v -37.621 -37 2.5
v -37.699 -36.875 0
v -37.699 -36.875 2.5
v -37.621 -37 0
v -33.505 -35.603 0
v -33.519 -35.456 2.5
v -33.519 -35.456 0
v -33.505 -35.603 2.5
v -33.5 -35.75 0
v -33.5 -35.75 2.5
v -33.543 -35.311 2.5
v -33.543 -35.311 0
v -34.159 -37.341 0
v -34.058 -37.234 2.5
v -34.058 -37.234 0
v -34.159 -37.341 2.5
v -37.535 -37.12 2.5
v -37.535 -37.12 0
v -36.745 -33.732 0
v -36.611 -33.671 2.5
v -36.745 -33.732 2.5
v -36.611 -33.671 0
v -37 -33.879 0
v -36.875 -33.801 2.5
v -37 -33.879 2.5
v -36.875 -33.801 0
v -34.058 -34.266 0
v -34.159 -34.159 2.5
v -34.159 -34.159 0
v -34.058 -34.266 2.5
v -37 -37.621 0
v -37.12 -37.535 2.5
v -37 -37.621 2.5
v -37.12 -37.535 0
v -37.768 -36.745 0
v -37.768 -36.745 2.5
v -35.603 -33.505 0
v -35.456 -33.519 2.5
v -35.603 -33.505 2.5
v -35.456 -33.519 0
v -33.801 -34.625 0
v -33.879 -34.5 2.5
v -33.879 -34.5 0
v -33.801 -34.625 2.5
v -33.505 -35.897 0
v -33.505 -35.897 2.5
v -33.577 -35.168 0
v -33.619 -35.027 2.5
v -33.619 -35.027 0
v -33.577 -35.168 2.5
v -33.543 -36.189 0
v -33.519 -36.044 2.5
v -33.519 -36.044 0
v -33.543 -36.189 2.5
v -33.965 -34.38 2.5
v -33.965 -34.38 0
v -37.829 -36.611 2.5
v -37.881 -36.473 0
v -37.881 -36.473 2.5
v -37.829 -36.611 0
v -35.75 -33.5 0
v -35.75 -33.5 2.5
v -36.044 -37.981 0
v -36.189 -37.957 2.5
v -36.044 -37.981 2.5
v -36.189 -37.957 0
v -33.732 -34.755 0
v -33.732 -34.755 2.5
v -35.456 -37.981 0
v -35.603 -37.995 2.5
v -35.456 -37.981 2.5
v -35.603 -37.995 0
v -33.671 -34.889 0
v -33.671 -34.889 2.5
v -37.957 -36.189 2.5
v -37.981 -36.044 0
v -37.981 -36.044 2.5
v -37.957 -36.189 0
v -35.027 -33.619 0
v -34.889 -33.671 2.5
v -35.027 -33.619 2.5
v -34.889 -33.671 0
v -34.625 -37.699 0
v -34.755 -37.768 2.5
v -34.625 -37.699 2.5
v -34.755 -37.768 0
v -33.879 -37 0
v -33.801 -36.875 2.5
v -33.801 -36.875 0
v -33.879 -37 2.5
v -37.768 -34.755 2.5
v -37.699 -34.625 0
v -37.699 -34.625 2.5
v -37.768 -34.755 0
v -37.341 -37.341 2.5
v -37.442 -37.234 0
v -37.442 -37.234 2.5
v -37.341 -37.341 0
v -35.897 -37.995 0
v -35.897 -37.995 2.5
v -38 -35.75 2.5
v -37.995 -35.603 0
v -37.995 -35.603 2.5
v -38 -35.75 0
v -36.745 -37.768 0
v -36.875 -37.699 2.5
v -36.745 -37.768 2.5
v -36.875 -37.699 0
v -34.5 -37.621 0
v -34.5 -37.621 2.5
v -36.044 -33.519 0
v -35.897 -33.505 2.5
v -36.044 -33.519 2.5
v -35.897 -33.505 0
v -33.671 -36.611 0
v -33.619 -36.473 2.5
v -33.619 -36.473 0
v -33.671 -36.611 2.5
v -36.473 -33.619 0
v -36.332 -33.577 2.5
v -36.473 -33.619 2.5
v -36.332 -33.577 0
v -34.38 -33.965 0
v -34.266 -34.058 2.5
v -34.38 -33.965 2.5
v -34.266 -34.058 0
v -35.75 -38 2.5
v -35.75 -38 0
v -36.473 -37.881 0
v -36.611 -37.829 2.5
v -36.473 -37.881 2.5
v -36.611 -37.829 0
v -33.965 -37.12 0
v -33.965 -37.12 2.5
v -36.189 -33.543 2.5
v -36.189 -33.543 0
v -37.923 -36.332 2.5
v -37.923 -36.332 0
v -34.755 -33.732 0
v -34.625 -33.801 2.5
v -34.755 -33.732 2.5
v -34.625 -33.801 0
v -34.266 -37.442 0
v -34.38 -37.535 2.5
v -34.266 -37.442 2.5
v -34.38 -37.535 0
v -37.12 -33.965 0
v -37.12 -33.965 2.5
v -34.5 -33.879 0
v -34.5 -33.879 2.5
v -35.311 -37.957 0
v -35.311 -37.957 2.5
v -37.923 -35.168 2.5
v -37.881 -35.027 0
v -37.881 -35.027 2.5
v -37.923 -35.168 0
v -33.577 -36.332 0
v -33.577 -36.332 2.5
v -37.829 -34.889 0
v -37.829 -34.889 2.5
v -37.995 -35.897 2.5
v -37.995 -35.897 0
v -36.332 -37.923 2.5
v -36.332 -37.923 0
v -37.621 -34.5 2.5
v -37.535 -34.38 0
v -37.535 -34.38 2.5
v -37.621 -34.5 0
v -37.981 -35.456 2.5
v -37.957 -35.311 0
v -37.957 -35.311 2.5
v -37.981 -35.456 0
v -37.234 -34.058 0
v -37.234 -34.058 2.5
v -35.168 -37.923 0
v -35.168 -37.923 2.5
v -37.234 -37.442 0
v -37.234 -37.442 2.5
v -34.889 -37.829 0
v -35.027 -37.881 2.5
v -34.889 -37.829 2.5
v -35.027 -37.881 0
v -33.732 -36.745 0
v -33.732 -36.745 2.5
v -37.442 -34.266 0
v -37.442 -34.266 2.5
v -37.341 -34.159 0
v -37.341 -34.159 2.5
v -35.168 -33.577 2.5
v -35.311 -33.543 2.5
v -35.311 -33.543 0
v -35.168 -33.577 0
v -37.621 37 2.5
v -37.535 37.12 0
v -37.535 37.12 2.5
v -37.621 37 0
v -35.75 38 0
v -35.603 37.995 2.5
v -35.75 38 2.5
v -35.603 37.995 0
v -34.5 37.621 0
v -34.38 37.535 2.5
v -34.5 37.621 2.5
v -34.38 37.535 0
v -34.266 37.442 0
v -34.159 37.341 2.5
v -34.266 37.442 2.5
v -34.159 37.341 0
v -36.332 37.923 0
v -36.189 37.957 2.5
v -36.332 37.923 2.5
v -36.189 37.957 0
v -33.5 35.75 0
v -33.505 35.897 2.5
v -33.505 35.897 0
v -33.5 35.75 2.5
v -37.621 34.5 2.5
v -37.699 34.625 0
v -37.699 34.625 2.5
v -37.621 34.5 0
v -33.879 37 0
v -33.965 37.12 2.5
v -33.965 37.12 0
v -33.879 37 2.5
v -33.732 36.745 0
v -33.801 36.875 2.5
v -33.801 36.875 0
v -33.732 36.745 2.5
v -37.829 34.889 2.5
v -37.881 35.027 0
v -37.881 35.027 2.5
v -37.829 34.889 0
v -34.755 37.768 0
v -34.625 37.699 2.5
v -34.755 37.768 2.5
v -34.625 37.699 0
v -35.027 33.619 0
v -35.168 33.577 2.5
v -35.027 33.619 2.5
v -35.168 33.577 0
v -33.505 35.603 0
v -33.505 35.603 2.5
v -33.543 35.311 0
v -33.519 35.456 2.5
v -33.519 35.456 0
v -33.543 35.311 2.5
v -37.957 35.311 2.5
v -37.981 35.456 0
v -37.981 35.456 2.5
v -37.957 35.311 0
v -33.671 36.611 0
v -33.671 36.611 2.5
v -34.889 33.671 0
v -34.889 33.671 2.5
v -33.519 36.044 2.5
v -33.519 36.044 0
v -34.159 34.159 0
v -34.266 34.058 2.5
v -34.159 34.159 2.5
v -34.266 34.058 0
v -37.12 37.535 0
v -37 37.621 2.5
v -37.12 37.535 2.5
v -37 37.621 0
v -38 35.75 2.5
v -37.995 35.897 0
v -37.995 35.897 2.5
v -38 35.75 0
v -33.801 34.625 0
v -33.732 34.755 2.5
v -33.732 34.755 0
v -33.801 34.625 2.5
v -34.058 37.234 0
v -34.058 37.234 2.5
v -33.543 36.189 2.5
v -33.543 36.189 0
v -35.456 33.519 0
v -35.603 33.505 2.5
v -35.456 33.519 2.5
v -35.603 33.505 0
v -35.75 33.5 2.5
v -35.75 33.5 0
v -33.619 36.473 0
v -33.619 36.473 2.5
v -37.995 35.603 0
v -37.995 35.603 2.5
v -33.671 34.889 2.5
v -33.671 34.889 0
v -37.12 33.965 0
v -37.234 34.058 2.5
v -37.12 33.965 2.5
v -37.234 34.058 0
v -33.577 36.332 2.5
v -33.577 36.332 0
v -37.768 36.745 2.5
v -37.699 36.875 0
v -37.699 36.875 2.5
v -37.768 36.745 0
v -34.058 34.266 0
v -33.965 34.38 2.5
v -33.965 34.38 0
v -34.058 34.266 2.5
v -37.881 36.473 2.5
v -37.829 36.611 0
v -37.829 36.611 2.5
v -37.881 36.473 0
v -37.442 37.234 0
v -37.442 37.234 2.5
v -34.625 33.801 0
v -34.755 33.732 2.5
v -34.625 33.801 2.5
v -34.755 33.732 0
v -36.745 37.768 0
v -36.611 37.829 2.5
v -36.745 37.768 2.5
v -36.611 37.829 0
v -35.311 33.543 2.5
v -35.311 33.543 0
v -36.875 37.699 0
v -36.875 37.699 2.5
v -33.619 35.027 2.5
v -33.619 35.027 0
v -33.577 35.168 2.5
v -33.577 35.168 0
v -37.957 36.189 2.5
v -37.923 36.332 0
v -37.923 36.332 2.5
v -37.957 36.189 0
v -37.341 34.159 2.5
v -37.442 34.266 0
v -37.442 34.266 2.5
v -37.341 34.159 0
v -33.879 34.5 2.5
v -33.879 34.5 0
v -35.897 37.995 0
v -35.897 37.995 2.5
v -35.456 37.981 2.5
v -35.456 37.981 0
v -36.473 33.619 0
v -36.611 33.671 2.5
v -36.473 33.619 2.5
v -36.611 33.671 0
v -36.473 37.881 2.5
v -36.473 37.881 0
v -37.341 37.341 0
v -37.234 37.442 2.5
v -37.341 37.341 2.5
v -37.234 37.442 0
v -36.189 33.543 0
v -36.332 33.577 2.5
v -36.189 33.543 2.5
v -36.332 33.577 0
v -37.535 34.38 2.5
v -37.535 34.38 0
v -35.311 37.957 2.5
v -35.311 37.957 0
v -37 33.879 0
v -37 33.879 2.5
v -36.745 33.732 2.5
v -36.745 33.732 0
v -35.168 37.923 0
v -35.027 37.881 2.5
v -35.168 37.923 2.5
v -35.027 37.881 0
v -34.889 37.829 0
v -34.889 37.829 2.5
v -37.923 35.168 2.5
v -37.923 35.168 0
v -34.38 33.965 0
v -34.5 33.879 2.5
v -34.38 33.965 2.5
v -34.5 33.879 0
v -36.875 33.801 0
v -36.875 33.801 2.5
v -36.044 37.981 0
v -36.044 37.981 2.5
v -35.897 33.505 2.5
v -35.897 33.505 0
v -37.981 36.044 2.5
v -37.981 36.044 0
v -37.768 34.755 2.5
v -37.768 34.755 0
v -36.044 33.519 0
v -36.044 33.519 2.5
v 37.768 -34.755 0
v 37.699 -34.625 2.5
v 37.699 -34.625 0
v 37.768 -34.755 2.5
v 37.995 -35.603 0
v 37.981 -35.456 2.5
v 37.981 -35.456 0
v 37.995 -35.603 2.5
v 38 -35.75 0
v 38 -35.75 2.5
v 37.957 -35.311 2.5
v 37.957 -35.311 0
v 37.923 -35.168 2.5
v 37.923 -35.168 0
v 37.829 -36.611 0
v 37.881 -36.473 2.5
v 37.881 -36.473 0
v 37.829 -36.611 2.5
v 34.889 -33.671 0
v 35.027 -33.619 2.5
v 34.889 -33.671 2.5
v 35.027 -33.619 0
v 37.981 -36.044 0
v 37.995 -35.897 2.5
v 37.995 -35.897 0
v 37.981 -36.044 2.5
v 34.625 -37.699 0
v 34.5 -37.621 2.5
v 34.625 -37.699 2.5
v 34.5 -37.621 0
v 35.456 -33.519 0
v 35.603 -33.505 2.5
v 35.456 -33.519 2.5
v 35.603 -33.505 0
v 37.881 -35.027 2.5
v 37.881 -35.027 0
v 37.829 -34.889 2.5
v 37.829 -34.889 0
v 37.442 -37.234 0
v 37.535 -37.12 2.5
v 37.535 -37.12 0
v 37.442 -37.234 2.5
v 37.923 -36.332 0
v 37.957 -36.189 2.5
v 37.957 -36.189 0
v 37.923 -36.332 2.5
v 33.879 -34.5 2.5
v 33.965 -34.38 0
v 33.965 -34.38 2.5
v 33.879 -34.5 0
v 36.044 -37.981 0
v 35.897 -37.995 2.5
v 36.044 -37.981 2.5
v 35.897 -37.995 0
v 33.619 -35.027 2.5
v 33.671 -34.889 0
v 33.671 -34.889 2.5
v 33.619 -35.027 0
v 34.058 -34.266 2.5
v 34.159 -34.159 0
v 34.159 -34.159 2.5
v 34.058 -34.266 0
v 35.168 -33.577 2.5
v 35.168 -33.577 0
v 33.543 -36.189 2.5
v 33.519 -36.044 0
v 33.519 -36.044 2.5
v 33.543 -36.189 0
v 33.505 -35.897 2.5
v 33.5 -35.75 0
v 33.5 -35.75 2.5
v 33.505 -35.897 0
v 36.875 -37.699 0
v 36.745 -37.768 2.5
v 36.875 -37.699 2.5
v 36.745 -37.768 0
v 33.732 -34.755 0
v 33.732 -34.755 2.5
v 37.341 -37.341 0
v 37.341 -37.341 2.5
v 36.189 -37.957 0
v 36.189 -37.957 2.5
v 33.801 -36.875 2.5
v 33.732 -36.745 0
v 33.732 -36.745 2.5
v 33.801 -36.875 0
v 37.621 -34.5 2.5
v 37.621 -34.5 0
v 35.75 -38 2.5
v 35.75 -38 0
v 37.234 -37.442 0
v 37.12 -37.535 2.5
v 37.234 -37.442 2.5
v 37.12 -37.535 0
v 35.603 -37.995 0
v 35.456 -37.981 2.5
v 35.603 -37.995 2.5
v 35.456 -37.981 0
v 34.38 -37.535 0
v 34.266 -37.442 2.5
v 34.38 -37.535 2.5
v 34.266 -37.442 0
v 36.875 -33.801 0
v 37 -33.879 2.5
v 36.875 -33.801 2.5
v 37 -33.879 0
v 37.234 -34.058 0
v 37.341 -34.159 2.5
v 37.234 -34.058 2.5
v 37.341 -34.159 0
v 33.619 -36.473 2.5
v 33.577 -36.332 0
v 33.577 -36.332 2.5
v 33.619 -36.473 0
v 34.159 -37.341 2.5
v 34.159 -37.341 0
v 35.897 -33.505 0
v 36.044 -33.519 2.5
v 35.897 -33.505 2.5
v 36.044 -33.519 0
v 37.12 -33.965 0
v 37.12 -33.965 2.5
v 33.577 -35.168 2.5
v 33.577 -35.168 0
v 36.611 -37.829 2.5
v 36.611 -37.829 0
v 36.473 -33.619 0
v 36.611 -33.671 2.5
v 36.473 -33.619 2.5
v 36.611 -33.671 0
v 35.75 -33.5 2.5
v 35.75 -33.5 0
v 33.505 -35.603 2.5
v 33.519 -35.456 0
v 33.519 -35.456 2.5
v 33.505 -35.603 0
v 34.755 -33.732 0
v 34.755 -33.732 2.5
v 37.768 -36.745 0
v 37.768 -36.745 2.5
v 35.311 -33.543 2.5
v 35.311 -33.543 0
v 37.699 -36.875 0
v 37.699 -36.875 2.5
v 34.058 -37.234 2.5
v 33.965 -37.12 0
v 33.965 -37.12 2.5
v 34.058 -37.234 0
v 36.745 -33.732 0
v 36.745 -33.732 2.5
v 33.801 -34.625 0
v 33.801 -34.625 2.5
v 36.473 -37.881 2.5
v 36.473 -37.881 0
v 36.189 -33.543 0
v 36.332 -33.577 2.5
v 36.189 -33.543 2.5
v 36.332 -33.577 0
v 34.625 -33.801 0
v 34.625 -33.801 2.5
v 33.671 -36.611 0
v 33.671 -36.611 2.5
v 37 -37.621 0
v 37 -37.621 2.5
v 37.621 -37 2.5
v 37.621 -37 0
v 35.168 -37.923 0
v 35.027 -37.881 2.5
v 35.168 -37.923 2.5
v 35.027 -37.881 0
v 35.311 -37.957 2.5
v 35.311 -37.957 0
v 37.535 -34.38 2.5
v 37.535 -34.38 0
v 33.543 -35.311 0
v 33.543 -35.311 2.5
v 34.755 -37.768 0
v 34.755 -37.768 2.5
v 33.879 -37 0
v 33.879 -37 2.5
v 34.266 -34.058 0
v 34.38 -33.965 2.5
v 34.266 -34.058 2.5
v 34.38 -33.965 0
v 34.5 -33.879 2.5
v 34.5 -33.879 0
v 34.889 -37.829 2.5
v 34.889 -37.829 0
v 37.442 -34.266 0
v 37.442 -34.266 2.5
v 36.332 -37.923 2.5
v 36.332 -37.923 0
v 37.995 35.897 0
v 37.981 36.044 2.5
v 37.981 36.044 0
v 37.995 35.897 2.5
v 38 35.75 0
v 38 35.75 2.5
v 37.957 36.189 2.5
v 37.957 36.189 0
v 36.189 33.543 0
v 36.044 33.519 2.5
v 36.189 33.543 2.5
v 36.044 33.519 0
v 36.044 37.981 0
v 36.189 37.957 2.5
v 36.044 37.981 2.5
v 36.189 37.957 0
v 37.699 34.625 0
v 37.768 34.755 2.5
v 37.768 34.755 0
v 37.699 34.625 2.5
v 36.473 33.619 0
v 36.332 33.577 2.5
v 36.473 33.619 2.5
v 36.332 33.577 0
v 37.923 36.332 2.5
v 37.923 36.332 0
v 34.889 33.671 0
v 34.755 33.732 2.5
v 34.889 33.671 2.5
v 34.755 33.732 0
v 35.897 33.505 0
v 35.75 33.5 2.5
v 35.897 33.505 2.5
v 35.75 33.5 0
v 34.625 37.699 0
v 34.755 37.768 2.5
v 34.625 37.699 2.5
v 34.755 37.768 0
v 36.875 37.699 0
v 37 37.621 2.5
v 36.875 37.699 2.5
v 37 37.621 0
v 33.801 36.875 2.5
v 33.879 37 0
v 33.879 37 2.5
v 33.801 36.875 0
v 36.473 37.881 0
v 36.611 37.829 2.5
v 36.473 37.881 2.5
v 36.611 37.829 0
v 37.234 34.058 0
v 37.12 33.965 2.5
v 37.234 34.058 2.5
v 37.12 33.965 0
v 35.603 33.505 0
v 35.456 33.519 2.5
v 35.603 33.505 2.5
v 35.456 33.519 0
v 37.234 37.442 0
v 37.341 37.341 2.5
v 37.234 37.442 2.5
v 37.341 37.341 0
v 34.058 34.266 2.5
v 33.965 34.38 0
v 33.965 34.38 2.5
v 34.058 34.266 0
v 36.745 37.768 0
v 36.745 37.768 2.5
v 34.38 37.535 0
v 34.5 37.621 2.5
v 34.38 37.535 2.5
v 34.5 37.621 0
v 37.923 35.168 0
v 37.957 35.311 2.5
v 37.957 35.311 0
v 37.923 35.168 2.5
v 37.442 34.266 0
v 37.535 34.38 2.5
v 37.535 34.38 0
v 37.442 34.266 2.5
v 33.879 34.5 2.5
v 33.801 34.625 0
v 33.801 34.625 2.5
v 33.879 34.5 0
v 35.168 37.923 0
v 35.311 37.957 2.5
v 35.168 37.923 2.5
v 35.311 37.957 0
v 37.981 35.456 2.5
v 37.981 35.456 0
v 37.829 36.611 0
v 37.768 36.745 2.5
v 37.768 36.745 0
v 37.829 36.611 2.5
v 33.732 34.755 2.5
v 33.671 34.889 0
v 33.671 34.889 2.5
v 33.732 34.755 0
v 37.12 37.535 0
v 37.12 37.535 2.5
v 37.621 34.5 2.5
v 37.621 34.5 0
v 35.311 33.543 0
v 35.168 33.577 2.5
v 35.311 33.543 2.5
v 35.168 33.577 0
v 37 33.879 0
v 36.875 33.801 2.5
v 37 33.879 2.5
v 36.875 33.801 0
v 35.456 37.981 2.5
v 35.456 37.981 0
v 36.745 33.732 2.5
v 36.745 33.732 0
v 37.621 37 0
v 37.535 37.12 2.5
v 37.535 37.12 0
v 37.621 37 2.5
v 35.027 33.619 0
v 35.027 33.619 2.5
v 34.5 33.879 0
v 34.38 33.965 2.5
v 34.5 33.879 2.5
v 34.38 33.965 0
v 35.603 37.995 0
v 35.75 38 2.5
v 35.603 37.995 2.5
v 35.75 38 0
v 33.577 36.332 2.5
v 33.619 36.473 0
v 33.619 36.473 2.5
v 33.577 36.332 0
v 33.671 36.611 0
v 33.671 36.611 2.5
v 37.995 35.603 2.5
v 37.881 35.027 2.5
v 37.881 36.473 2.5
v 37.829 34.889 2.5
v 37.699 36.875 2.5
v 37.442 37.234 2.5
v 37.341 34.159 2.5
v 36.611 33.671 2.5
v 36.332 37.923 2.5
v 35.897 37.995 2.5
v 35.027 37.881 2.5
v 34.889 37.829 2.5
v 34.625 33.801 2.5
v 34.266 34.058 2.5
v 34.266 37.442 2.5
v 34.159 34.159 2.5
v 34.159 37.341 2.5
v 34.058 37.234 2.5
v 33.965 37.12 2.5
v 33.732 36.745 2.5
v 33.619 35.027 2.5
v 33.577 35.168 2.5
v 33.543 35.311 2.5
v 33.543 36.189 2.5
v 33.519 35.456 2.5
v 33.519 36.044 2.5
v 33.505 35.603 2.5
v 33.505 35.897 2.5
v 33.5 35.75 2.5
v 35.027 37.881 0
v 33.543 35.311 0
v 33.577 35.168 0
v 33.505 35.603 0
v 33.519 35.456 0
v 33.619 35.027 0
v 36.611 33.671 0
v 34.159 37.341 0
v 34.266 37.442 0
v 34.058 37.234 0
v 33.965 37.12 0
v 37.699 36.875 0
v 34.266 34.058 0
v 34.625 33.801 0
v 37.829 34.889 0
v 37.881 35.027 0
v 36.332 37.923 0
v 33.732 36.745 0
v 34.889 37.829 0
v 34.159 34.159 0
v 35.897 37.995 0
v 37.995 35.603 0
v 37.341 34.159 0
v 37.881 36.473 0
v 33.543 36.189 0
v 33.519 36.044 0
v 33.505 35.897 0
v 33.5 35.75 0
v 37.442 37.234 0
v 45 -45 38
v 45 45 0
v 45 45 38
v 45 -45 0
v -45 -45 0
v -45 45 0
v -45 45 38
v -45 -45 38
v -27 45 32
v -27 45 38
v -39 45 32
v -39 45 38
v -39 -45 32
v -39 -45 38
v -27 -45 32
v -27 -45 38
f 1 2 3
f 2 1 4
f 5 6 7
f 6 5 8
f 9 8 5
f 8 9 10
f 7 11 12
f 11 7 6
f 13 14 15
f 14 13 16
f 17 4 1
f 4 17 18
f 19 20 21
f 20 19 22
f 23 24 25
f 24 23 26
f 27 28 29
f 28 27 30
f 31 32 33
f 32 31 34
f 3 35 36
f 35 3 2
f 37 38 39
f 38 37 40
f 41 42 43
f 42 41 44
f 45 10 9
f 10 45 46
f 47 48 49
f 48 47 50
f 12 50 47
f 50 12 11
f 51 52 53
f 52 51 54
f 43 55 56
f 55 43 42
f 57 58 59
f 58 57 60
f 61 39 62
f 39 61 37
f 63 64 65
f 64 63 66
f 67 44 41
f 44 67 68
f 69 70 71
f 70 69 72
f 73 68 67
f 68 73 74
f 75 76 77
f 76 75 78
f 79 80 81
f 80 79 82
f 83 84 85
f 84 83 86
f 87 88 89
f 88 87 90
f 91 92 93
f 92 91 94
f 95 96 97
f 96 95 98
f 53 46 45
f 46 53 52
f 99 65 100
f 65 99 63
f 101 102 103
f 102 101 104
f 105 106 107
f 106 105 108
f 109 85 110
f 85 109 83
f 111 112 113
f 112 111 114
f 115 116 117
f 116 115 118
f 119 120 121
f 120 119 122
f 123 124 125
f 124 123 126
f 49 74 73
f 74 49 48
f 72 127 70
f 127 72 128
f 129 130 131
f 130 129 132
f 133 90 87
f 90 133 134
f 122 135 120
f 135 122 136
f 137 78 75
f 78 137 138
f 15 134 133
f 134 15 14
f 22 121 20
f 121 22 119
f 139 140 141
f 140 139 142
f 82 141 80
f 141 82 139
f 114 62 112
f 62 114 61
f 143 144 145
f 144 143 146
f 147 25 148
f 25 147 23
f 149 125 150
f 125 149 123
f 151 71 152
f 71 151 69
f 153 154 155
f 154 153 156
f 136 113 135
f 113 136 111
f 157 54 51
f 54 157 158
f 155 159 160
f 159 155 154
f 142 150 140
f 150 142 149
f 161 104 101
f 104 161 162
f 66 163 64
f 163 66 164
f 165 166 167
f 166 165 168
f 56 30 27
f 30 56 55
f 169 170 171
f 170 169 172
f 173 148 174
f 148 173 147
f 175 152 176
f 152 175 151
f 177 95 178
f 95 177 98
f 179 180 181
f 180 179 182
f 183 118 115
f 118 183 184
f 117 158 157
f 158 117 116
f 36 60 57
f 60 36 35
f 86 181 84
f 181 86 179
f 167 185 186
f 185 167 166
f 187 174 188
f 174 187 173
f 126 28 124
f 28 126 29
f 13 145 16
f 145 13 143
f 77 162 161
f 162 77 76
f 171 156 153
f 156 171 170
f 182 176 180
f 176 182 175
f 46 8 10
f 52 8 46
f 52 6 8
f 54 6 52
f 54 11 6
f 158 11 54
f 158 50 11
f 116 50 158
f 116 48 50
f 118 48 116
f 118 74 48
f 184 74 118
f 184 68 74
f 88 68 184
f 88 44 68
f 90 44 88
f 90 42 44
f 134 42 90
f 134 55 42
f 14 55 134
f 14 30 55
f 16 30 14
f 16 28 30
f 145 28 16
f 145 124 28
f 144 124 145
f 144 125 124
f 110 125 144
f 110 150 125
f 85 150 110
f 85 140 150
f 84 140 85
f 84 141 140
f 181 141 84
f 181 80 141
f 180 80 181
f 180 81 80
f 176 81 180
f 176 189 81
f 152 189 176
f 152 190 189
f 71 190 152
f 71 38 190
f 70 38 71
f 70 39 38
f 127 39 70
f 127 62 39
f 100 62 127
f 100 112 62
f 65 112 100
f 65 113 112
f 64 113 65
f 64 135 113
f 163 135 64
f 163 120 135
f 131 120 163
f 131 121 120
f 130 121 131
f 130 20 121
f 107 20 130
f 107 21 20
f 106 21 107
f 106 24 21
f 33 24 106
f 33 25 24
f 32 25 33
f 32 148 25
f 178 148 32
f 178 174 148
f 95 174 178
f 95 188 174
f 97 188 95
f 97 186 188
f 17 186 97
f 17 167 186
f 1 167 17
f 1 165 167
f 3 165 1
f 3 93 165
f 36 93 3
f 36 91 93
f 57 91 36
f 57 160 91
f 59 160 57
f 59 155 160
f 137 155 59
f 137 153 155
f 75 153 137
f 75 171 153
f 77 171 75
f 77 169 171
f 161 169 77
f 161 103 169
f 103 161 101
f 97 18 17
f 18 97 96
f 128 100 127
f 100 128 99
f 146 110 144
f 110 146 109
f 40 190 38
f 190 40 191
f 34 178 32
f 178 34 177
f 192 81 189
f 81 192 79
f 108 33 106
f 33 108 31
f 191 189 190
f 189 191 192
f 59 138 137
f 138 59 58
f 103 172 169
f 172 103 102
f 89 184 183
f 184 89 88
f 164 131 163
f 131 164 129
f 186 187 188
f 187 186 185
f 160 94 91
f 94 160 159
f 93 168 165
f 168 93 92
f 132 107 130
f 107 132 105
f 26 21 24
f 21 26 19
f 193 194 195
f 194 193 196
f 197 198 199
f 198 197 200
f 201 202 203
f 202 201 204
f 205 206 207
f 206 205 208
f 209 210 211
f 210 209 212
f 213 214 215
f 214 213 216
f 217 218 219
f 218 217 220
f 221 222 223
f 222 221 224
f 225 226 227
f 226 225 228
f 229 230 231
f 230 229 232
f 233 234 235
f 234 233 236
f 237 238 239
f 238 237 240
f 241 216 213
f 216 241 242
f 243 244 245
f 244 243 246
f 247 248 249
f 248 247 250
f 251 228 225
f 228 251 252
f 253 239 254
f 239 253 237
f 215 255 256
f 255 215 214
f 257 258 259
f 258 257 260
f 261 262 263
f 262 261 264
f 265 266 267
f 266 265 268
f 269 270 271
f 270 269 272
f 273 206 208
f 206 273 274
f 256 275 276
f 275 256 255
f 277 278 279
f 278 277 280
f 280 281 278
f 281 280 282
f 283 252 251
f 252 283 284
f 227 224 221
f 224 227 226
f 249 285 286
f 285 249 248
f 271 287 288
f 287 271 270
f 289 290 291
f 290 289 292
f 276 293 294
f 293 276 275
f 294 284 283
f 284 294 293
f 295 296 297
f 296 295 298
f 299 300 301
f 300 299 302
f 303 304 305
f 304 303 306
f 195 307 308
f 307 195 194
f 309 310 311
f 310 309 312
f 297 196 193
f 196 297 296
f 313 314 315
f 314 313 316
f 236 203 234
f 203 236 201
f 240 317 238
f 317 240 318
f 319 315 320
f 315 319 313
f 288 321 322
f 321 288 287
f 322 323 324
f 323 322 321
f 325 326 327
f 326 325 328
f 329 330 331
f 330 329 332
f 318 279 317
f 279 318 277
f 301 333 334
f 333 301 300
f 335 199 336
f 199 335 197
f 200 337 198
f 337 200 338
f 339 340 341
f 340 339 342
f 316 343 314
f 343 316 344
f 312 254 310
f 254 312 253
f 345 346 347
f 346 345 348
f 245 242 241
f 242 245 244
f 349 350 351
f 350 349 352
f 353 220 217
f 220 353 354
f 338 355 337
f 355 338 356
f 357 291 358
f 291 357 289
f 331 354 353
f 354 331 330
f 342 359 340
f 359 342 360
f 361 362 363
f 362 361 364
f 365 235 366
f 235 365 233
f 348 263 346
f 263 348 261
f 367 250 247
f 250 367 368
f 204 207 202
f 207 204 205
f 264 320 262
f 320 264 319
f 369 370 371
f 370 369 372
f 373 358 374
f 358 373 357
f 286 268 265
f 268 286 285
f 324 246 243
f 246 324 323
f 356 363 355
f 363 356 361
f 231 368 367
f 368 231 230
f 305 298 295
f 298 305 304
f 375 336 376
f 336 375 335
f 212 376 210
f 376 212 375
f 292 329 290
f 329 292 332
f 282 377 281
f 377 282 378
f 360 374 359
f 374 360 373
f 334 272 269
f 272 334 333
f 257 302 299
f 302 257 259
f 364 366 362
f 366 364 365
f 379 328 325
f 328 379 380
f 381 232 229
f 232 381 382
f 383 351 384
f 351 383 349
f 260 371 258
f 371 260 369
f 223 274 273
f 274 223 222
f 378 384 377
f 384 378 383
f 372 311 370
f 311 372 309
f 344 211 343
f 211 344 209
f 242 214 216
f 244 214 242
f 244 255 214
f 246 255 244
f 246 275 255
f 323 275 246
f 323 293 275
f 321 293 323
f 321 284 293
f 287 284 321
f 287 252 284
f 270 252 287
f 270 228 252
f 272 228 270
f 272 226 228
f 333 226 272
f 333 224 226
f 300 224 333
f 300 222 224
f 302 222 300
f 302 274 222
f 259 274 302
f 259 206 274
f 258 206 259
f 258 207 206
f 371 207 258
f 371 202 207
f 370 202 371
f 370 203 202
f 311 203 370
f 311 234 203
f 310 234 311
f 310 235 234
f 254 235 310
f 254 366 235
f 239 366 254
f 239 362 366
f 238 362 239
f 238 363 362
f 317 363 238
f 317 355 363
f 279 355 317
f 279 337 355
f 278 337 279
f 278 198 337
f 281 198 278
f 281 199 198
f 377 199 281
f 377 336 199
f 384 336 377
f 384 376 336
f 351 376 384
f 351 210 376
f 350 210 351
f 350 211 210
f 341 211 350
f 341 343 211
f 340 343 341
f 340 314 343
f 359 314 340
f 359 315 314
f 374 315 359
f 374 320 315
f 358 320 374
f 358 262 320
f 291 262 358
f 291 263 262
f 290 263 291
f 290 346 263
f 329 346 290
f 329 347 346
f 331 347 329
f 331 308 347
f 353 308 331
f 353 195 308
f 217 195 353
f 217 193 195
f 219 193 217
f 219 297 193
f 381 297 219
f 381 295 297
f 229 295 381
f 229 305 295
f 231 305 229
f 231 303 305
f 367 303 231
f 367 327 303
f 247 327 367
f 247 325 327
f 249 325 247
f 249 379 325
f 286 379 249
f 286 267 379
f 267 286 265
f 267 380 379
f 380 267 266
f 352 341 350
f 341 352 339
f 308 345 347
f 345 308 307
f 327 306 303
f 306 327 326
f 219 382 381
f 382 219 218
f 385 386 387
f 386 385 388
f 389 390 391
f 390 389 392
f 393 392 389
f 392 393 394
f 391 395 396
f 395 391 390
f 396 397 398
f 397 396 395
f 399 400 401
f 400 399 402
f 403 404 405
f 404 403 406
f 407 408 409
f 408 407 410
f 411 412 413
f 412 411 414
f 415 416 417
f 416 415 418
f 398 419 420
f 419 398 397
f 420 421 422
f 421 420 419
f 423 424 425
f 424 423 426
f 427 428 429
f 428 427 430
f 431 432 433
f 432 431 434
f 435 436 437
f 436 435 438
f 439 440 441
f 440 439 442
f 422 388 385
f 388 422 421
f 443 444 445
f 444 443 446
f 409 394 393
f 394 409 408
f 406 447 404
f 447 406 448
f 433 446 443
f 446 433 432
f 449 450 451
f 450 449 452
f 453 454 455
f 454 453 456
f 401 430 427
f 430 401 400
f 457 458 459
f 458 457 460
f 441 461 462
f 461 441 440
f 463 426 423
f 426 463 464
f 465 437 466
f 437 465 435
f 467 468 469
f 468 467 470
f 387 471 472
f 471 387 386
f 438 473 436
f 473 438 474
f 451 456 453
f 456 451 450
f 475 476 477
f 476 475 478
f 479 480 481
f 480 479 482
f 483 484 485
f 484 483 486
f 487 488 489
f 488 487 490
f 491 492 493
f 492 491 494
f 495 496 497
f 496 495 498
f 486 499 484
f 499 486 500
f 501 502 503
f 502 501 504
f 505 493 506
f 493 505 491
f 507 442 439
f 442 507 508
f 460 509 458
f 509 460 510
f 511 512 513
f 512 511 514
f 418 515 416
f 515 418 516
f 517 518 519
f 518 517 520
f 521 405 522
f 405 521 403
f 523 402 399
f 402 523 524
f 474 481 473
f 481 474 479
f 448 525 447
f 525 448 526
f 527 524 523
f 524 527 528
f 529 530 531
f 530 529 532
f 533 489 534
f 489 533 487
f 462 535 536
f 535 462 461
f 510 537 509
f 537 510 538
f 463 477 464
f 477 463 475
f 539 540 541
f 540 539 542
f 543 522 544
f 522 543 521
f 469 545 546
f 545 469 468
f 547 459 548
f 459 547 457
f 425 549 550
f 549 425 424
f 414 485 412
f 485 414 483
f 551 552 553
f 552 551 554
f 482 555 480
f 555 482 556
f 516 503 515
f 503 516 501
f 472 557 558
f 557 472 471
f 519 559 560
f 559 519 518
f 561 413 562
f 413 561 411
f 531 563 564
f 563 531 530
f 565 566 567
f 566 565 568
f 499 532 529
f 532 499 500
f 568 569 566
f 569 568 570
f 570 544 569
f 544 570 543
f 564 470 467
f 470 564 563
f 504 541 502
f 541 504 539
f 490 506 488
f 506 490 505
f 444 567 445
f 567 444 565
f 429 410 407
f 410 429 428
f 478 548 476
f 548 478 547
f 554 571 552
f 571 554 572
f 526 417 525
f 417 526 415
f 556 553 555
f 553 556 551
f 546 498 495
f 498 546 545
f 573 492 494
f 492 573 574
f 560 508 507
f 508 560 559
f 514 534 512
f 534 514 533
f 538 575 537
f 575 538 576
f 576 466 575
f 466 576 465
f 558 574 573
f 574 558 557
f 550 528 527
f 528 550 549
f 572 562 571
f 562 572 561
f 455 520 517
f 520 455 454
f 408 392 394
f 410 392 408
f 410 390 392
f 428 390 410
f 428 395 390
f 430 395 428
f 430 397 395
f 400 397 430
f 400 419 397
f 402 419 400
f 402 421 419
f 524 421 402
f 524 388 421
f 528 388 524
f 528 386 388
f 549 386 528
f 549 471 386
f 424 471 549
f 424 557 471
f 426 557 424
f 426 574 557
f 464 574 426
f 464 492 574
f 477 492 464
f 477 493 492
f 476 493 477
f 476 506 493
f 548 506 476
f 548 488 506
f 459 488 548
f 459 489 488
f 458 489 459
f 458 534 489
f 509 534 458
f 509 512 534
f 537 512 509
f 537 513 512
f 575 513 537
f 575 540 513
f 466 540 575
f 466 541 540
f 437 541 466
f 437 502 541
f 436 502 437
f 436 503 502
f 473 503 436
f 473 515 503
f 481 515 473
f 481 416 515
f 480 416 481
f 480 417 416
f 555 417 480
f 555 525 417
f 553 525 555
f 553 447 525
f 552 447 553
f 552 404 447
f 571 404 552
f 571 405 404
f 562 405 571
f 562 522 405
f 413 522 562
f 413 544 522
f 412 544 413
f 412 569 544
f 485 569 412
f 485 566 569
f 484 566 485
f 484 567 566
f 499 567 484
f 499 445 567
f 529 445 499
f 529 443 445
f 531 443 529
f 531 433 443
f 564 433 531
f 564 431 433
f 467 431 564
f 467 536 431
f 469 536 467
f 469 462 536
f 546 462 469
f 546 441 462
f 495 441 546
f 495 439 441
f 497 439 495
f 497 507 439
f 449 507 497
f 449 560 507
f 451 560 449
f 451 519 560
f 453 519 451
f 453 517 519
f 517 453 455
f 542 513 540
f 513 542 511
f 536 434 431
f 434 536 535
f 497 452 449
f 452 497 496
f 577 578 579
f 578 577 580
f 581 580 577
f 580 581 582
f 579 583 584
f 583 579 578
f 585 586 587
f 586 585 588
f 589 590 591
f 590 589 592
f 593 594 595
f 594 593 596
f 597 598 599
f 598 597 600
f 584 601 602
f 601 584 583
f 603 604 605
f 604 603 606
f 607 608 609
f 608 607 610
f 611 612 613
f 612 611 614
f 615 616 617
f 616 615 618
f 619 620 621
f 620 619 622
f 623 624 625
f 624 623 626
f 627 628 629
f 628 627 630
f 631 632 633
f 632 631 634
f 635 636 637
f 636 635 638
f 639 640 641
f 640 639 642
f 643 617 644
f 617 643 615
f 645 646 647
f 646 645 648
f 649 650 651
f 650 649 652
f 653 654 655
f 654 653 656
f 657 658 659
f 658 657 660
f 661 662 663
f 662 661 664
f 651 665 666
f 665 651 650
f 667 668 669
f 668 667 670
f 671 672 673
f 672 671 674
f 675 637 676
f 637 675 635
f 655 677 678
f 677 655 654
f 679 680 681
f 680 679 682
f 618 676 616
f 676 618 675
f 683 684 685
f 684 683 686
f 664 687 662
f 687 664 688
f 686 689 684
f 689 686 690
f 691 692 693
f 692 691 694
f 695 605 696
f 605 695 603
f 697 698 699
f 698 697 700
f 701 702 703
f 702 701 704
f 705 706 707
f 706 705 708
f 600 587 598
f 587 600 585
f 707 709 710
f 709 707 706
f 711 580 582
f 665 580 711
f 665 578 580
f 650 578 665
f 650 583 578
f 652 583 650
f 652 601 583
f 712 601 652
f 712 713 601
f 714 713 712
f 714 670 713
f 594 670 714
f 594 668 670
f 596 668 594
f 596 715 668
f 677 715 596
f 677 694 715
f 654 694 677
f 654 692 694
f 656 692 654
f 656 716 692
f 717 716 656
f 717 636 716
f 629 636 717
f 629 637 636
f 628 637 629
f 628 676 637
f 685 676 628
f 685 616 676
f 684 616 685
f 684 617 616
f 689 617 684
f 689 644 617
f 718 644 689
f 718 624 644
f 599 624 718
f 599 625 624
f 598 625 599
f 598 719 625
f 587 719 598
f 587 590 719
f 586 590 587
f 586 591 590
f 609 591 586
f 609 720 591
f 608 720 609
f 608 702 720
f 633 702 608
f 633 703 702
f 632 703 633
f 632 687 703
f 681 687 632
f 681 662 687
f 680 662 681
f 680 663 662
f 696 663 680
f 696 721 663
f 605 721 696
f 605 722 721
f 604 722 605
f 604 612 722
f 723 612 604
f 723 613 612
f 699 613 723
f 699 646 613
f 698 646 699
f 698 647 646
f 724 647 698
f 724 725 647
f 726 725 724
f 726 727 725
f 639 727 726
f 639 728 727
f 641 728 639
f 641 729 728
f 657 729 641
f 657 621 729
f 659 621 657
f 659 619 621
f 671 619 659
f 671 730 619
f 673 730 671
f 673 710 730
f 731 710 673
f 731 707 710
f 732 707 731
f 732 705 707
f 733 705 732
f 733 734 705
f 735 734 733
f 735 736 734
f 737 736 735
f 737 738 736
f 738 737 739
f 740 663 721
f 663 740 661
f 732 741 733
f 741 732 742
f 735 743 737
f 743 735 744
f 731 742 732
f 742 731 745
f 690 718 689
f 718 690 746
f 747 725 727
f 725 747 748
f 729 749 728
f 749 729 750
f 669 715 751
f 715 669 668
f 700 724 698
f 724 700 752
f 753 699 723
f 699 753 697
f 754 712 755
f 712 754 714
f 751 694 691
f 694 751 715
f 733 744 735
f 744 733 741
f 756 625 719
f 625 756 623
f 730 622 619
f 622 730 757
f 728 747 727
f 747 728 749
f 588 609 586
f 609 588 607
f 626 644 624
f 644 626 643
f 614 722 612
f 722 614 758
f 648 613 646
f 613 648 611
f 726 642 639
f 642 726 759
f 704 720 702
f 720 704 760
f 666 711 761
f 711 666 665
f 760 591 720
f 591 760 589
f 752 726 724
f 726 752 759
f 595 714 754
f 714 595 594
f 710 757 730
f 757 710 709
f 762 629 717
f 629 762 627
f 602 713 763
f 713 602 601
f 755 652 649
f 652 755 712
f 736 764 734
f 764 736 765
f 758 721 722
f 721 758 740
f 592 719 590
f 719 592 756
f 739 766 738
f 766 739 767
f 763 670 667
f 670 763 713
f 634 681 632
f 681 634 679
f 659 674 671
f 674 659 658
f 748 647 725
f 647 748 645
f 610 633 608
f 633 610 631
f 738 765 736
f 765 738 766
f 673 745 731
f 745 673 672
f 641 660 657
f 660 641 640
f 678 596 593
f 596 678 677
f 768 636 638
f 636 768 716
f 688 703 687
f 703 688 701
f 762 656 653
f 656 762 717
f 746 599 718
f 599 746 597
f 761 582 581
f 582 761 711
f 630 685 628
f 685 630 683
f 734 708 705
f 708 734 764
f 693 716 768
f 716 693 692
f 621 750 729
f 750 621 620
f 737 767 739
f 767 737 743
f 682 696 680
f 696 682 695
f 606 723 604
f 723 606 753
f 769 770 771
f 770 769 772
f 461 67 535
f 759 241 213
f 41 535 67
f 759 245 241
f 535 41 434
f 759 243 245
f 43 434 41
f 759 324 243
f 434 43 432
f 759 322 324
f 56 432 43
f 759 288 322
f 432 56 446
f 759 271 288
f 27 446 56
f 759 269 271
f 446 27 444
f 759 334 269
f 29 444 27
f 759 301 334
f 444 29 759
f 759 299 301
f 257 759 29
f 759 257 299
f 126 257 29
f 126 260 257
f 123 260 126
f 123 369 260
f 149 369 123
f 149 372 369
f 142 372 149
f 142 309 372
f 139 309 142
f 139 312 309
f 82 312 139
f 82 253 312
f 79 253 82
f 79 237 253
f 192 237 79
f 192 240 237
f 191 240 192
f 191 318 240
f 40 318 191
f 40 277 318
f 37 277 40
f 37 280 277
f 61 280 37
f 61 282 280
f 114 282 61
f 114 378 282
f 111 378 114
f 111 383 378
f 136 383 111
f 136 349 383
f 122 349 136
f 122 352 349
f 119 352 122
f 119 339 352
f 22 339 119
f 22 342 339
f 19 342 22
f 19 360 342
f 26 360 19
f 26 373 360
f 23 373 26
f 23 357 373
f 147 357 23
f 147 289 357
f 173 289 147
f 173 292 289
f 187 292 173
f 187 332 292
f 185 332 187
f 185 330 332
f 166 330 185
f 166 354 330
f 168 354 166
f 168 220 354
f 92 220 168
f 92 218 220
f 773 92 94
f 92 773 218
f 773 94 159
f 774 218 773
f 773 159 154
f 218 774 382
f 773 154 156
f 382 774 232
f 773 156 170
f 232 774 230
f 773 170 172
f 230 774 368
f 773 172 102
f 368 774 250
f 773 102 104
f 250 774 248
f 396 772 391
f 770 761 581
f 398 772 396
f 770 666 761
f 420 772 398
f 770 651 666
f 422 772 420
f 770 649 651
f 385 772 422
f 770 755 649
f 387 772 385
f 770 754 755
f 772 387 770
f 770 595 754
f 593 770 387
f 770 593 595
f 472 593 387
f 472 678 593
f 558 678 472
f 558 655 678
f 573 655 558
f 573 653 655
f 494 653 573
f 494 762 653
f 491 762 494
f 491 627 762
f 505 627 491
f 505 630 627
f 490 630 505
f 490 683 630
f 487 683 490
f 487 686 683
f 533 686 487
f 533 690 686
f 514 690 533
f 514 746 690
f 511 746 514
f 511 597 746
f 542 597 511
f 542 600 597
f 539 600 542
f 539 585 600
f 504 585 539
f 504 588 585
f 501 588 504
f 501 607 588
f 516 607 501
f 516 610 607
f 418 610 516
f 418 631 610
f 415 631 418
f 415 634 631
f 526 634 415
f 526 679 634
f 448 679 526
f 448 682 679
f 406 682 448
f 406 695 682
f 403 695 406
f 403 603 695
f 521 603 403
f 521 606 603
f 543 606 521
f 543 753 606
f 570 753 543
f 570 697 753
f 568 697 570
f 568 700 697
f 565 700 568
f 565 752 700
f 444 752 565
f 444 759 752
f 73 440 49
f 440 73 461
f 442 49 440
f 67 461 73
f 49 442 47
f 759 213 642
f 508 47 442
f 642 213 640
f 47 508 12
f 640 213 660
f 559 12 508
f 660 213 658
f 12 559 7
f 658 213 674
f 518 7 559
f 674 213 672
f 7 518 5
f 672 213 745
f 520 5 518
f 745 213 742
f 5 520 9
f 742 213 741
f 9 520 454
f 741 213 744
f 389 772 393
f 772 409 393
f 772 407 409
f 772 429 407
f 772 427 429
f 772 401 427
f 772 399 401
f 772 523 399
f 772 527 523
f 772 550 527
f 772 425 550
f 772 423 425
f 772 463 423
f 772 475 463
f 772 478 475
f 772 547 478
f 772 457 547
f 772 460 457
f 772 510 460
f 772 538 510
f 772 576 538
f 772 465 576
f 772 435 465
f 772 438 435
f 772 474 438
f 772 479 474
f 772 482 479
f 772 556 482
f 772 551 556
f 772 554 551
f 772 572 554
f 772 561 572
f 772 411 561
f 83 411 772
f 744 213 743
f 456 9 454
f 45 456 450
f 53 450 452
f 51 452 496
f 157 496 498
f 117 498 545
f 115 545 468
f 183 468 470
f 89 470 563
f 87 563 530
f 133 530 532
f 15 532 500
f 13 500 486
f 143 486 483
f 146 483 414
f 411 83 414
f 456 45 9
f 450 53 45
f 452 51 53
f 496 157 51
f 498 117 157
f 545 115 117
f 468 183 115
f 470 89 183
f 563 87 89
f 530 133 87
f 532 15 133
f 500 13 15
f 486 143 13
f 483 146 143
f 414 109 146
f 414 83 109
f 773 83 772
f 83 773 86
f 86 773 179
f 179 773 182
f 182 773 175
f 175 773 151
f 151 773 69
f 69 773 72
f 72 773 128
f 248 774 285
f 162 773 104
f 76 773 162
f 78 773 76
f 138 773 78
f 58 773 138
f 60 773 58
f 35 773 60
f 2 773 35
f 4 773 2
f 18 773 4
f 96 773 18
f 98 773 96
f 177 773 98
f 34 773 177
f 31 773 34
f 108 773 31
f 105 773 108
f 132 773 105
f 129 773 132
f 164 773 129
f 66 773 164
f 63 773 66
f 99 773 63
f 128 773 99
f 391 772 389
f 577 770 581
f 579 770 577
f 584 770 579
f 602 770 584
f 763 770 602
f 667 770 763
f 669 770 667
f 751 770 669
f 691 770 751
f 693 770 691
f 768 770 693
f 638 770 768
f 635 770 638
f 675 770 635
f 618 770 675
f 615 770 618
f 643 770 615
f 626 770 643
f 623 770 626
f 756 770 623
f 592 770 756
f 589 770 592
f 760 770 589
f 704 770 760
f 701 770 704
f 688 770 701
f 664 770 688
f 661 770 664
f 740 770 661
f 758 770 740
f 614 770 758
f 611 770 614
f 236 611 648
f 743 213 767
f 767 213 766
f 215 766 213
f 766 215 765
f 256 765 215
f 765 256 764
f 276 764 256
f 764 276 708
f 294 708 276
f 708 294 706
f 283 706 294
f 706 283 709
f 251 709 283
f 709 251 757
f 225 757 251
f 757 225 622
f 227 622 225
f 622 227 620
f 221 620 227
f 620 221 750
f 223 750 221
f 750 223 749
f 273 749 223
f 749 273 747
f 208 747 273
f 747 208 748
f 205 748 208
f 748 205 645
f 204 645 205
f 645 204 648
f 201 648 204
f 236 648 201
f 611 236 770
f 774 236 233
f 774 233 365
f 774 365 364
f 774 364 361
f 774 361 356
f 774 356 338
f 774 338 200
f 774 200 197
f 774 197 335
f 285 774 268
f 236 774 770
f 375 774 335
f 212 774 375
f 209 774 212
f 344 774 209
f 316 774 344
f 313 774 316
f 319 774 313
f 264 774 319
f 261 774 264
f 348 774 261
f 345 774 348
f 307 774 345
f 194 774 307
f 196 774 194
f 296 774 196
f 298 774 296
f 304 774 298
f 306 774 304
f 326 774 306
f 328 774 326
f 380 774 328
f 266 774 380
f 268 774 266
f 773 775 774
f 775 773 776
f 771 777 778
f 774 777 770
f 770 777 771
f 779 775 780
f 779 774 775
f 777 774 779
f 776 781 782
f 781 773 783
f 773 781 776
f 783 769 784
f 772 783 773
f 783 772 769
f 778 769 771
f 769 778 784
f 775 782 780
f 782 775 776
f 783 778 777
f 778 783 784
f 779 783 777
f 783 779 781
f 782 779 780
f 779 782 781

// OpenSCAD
// DIY magnetic stirrer housing (print orientation: upside-down open box)
// Units: mm. Walls 2.5 mm thick. Top plate 2 mm thick.

// ---------- Parameters ----------
box_outer_x   = 90;    // outer length in X
box_outer_y   = 90;    // outer width in Y
wall_thick    = 2.5;   // wall thickness
top_thick     = 2;     // top plate thickness
open_height   = 38;    // height of open box (top at z=40)
screw_hole    = 4.5;   // M4 screw hole diameter
screw_pitch   = 71.5;  // square hole pattern side
notch_w       = 12;    // cable notch width
notch_depth   = 8;     // notch depth from open edge
eps           = 0.5;   // cutter overshoot past faces
$fn           = 96;    // curve resolution

// ---------- Model ----------
difference() {
    // Solid outer block (z = 0 to 40)
    translate([-box_outer_x/2, -box_outer_y/2, 0])
        cube([box_outer_x, box_outer_y, 40]);

    // Open top: cut out the box interior, leaving the top plate (z = 0 to 2)
    translate([-box_outer_x/2, -box_outer_y/2, 38])
        cube([box_outer_x, box_outer_y, wall_thick + eps]);

    // Screw holes through the top plate on a centred square pattern
    for (sx = [-1, 1], sy = [-1, 1])
        translate([sx * screw_pitch/2, sy * screw_pitch/2, -eps])
            cylinder(d = screw_hole, h = top_thick + 2 * eps);

    // Cable notch in one wall: 12 mm wide, centred along the wall,
    // reaching 8 mm down from the open edge (z = 32 to z = 40)
    translate([-box_outer_x/2 + notch_w/2, -box_outer_y/2, 32])
        cube([notch_w, box_outer_y, notch_depth + eps]);
}
